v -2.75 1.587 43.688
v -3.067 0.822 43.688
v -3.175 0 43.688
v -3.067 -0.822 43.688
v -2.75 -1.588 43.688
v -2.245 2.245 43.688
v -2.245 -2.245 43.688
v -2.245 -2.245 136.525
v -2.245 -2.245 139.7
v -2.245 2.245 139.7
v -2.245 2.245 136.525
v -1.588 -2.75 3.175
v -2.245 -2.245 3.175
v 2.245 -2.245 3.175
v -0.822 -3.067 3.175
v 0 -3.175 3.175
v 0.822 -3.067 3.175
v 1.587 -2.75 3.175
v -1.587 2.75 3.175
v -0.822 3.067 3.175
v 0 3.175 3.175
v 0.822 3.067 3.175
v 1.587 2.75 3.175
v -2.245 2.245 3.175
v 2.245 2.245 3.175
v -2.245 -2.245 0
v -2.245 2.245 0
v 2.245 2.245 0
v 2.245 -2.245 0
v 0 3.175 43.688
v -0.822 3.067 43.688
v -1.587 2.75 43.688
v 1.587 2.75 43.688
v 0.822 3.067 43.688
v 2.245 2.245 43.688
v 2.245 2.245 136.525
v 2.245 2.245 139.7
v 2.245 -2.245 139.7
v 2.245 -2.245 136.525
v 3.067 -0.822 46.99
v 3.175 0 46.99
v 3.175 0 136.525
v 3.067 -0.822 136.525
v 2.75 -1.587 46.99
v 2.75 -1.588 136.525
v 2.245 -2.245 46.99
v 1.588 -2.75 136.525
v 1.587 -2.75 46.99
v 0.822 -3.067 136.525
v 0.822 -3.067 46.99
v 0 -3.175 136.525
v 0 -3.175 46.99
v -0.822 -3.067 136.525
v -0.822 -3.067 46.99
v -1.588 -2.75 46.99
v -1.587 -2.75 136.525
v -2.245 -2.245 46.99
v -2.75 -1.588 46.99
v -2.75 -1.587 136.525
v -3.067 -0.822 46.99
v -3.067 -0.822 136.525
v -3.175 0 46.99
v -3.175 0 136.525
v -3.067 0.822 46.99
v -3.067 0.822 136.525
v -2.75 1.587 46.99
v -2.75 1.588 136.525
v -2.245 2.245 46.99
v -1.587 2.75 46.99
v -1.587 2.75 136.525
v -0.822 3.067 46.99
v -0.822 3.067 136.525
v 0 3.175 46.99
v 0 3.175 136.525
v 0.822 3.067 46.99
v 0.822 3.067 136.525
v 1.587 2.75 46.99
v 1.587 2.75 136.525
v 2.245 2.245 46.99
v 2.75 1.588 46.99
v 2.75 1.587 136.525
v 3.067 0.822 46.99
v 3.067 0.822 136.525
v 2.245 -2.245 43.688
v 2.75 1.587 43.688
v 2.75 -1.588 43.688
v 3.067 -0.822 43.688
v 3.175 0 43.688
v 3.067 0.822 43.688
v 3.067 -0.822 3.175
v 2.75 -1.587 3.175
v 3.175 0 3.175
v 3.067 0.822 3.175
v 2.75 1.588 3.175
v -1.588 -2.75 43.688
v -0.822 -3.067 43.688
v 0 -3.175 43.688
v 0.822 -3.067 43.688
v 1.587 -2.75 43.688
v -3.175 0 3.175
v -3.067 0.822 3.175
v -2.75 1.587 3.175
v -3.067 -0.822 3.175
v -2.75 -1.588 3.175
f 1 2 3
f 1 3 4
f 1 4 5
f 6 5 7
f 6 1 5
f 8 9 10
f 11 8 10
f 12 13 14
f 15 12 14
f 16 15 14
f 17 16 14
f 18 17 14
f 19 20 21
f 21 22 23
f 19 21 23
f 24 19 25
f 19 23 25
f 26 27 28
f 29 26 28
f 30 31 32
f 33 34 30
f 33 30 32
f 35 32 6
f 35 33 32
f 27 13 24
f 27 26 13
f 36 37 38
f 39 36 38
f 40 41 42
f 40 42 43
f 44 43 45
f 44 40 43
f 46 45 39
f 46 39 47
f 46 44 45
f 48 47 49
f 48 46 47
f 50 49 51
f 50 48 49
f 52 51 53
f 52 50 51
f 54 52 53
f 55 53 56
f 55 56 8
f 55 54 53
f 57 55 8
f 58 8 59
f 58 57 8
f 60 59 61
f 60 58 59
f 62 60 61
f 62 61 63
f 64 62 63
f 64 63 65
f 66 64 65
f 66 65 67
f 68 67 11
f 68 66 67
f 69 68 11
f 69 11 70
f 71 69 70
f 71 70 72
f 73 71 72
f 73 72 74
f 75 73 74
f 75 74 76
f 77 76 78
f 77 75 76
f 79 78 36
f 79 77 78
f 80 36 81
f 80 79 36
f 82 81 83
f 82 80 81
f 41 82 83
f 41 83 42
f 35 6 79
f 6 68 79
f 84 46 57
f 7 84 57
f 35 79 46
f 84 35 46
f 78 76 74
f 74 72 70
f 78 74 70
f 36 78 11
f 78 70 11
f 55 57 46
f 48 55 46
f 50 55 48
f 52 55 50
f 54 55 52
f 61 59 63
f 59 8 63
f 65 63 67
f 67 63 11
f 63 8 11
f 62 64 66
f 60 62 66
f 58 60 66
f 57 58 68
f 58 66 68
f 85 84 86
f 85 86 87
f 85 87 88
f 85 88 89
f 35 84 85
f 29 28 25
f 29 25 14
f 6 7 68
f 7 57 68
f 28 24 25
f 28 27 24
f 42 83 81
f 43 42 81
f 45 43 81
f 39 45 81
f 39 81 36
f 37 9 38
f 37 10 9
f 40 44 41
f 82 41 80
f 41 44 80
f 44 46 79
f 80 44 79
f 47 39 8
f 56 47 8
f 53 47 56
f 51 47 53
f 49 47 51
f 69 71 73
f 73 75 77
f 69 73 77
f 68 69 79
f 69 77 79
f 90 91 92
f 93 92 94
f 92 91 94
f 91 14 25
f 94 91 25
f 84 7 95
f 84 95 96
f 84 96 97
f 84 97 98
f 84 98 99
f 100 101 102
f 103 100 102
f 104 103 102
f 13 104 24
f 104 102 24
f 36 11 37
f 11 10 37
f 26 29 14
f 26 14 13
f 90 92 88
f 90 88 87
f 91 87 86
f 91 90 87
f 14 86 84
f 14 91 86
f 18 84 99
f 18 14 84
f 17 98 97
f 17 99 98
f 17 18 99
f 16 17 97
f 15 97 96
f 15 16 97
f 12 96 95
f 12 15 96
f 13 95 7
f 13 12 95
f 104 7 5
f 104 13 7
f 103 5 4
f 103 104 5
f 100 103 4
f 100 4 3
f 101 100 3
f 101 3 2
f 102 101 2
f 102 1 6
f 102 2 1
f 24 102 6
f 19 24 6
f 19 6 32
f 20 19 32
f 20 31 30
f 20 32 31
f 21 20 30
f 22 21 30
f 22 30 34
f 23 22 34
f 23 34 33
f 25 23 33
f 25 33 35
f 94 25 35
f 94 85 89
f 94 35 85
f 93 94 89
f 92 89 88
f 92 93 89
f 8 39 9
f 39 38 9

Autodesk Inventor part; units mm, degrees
ref_plane "YZ Plane" through (0, 0, 0) normal (1, 0, 0) x (0, 1, 0)
ref_plane "XZ Plane" through (0, 0, 0) normal (0, 1, 0) x (-1, 0, 0)
ref_plane "XY Plane" through (0, 0, 0) normal (0, 0, 1) x (1, 0, 0)
sketch "Sketch1" plane through (0, 0, 0) normal (0, 0, 1) x (1, 0, 0)
  circle A0 centre (0, 0) radius 3.175
  line L0 (-2.2451, 2.2451) -> (2.2451, 2.2451)
  line L1 (2.2451, 2.2451) -> (2.2451, -2.2451)
  line L2 (2.2451, -2.2451) -> (-2.2451, -2.2451)
  line L3 (-2.2451, -2.2451) -> (-2.2451, 2.2451)
  line L4 (-2.2451, 2.2451) -> (2.2451, -2.2451) construction
  line L5 (2.2451, 2.2451) -> (-2.2451, -2.2451) construction
  dimension "d0" = 6.35
  dimension "d6" = 4.4901
  dimension "d7" = 4.4901
extrude "Extrusion1" add sketch "Sketch1" along normal blind 139.7
extrude "Extrusion2" cut sketch "Sketch1" along normal blind 3.175 contours A0 L1 | L0 A0 | A0 L2 | L3 A0
ref_plane "Work Plane1" through (0, 0, 139.7) normal (0, 0, -1) x (-1, 0, 0)
sketch "Sketch2" plane through (0, 0, 139.7) normal (0, 0, -1) x (-1, 0, 0)
  line L0 (-2.2451, 2.2451) -> (-2.2451, -2.2451) projected
  line L1 (2.2451, 2.2451) -> (-2.2451, 2.2451)
  line L2 (-2.2451, 2.2451) -> (-2.2451, -2.2451)
  line L3 (-2.2451, -2.2451) -> (2.2451, -2.2451)
  line L4 (2.2451, -2.2451) -> (2.2451, 2.2451)
  line L5 (2.2451, 2.2451) -> (-2.2451, -2.2451) construction
  line L6 (-2.2451, 2.2451) -> (2.2451, -2.2451) construction
  circle A0 centre (0, 0) radius 3.175
  dimension "d11" = 4.4901
  dimension "d12" = 4.4901
  dimension "d13" = 6.35
extrude "Extrusion3" cut sketch "Sketch2" along normal blind 3.175 contours A0 L1 | L0 A0 | L3 A0 | A0 L4
ref_plane "Work Plane2" through (0, 0, 46.99) normal (0, 0, 1) x (1, 0, 0)
sketch "Sketch3" plane through (0, 0, 46.99) normal (0, 0, 1) x (1, 0, 0)
  circle A0 centre (0, 0) radius 3.175
  line L0 (-2.2451, 2.2451) -> (2.2451, 2.2451)
  line L1 (2.2451, 2.2451) -> (2.2451, -2.2451)
  line L2 (2.2451, -2.2451) -> (-2.2451, -2.2451)
  line L3 (-2.2451, -2.2451) -> (-2.2451, 2.2451)
  line L4 (-2.2451, 2.2451) -> (2.2451, -2.2451) construction
  line L5 (2.2451, 2.2451) -> (-2.2451, -2.2451) construction
  dimension "d17" = 4.4901
  dimension "d18" = 4.4901
extrude "Extrusion4" cut sketch "Sketch3" against normal blind 3.302 contours A0 L1 | L0 A0 | A0 L2 | L3 A0
properties part number "rod"
